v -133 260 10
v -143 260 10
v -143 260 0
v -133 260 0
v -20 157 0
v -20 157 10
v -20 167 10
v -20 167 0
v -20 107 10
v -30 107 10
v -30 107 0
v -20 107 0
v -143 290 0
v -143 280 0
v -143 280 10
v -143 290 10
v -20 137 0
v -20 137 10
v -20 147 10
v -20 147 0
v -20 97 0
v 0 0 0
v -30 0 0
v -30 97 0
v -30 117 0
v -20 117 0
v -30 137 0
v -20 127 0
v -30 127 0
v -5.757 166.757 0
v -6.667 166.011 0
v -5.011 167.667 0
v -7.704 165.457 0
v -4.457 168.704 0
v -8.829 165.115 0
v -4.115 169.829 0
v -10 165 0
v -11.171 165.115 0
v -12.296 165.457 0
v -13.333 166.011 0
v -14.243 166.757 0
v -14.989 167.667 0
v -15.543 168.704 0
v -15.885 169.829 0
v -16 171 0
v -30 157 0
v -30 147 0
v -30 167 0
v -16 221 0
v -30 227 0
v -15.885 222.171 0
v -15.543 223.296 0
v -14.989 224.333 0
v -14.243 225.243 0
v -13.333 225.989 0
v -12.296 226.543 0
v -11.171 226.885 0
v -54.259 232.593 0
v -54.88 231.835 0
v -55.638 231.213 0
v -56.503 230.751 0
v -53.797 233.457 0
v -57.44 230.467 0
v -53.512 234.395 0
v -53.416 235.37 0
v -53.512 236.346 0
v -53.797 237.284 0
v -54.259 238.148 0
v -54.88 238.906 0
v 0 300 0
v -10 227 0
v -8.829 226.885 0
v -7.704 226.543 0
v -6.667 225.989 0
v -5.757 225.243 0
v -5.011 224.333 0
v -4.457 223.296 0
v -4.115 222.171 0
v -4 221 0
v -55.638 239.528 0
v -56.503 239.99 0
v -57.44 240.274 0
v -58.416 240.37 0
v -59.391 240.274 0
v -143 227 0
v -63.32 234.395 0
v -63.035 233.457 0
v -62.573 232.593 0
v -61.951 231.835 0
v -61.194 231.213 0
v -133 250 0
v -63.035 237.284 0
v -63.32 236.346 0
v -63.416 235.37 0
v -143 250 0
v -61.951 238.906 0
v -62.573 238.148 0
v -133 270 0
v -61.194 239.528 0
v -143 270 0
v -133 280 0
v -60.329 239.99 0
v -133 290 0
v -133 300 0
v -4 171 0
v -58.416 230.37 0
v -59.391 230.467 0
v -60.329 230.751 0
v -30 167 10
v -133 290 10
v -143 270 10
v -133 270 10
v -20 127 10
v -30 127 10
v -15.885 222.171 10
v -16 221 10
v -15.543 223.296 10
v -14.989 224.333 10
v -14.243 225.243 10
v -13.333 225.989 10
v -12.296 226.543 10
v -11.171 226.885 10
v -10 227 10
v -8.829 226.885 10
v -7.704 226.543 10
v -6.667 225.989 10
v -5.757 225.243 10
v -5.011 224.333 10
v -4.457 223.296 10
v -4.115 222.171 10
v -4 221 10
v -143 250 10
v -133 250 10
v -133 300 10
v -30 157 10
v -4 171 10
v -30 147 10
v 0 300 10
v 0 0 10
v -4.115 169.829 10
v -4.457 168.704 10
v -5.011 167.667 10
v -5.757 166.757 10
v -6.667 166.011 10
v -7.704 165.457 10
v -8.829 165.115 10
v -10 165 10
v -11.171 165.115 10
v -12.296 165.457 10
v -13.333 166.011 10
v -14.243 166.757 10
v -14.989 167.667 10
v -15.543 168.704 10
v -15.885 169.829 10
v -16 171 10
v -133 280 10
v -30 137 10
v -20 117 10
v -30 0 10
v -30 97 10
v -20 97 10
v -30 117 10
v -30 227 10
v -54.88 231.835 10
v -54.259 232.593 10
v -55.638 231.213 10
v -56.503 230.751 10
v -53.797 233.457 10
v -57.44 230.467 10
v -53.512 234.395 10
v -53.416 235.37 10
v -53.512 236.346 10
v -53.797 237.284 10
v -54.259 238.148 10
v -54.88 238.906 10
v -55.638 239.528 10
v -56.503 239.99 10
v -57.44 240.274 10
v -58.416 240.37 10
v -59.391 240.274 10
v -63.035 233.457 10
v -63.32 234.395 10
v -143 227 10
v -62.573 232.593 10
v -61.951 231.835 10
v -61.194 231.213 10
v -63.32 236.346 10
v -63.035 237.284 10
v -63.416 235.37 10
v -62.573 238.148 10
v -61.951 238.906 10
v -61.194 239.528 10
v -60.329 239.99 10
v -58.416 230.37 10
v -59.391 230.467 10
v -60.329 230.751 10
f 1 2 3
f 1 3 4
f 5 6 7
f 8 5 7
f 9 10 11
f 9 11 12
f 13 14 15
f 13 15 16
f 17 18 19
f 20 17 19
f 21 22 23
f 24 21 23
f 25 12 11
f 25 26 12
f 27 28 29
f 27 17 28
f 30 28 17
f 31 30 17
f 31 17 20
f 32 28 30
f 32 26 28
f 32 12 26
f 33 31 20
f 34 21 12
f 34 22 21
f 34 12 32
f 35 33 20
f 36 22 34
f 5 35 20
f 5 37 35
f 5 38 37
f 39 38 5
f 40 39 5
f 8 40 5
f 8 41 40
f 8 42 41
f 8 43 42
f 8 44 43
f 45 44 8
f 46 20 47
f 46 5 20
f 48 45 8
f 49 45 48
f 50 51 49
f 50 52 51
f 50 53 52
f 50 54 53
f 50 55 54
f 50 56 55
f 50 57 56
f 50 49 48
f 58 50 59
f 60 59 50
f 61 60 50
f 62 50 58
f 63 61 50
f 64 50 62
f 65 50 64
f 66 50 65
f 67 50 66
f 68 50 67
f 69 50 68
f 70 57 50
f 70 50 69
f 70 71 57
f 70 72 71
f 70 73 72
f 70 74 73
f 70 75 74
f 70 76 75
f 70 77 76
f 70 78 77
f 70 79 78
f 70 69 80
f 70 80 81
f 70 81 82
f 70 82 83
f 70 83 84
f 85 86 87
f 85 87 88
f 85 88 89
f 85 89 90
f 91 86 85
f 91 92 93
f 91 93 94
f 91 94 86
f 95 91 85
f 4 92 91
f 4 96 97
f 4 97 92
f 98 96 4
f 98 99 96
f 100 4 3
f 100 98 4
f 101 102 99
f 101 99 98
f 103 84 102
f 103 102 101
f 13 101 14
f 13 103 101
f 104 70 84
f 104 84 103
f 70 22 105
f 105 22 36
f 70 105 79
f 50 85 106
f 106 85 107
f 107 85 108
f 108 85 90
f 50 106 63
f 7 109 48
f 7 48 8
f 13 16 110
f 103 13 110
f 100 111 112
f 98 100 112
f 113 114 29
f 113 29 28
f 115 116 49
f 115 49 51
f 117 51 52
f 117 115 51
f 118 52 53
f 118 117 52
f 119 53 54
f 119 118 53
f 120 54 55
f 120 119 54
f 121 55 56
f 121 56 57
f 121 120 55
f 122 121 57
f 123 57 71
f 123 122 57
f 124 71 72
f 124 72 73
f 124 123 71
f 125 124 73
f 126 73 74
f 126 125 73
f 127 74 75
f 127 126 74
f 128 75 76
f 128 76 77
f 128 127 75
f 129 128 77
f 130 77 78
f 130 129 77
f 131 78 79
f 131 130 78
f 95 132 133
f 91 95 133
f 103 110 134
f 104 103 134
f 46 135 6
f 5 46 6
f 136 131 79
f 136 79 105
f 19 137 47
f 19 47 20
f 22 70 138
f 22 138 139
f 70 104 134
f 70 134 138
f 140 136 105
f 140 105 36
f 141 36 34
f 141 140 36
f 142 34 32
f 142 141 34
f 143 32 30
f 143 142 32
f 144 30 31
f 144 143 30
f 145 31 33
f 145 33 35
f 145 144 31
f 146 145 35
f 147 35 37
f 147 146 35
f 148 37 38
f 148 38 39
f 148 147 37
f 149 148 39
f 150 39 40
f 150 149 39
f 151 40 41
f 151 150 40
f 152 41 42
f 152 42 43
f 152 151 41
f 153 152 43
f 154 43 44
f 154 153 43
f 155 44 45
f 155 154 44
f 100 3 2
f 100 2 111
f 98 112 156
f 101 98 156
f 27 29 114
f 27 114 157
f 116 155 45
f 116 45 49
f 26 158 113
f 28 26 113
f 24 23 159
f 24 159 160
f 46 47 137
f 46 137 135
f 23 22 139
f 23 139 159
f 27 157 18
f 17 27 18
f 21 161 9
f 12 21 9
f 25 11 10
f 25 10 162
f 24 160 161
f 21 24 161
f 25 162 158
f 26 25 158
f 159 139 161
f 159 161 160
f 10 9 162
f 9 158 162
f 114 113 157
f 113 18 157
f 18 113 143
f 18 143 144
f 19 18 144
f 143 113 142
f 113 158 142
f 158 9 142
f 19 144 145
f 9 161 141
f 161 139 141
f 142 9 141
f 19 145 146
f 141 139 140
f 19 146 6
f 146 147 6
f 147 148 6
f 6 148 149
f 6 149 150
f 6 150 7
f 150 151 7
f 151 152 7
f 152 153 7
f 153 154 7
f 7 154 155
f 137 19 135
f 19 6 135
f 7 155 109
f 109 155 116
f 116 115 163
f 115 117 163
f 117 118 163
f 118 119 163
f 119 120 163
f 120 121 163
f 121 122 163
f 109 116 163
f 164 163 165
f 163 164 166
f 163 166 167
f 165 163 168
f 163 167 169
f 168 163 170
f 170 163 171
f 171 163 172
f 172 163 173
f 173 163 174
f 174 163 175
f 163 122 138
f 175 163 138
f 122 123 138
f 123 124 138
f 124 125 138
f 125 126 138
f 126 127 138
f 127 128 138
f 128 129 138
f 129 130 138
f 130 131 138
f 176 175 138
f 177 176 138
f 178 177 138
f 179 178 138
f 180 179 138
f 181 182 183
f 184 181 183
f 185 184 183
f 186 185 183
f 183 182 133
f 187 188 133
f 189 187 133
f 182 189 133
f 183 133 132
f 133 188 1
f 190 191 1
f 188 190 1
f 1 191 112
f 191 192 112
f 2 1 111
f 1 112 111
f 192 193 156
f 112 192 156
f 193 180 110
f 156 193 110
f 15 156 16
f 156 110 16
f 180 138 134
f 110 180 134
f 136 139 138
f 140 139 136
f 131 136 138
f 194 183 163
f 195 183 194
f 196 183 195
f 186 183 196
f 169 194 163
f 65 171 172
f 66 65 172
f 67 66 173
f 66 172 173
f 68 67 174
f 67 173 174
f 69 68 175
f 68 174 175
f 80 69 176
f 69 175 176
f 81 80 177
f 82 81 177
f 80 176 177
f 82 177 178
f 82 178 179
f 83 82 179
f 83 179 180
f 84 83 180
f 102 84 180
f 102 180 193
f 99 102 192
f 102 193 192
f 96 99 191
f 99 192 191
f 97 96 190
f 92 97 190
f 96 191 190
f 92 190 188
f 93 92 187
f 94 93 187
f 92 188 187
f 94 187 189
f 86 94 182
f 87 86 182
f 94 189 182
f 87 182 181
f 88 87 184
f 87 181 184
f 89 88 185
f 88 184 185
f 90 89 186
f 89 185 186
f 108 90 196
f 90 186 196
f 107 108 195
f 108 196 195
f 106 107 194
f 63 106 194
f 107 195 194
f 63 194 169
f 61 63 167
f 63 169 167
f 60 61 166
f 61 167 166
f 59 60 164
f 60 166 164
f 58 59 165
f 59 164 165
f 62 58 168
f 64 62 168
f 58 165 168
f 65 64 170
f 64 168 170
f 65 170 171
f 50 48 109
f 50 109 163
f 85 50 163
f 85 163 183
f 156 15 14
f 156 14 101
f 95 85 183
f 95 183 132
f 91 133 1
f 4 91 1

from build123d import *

# Parameters (mm, degrees)
BOSS_EXTRU_1_DEPTH         = 10
ESQUISSE2_W                = 10
ESQUISSE2_H                = 10
ENL_V_MAT_EXTRU_1_DEPTH    = 10
R_P_TITION_LIN_AIRE1_COUNT = 3
R_P_TITION_LIN_AIRE1_PITCH = 20
ESQUISSE3_W                = 10
ESQUISSE3_H                = 10
ENL_V_MAT_EXTRU_2_DEPTH    = 10
R_P_TITION_LIN_AIRE2_COUNT = 4
R_P_TITION_LIN_AIRE2_PITCH = 20
ENL_V_MAT_EXTRU_3_DEPTH    = 10
ESQUISSE5_R                = 5
ENL_V_MAT_EXTRU_4_DEPTH    = 10


with BuildPart() as part:
    # Esquisse1 → Boss.-Extru.1 (new body)
    with BuildSketch(Plane.XY):
        Polygon((0, 0), (-30, 0), (-30, 227), (-143, 227), (-143, 300), (0, 300), align=None)
    extrude(amount=BOSS_EXTRU_1_DEPTH)

    # Esquisse2 → Enlèv. mat.-Extru.1 (cut)
    with BuildSketch(Plane.XY.offset(10)):
        with Locations((-138, 295)):
            Rectangle(ESQUISSE2_W, ESQUISSE2_H)
    enl_v_mat_extru_1 = extrude(amount=-ENL_V_MAT_EXTRU_1_DEPTH, mode=Mode.SUBTRACT)

    # Répétition linéaire1: Enlèv. mat.-Extru.1 ×3
    with Locations(*[(0, -i * R_P_TITION_LIN_AIRE1_PITCH, 0) for i in range(1, R_P_TITION_LIN_AIRE1_COUNT)]):
        add(enl_v_mat_extru_1, mode=Mode.SUBTRACT)

    # Esquisse3 → Enlèv. mat.-Extru.2 (cut)
    with BuildSketch(Plane.XY.offset(10)):
        with Locations((-25, 162)):
            Rectangle(ESQUISSE3_W, ESQUISSE3_H)
    enl_v_mat_extru_2 = extrude(amount=-ENL_V_MAT_EXTRU_2_DEPTH, mode=Mode.SUBTRACT)

    # Répétition linéaire2: Enlèv. mat.-Extru.2 ×4
    with Locations(*[(0, -i * R_P_TITION_LIN_AIRE2_PITCH, 0) for i in range(1, R_P_TITION_LIN_AIRE2_COUNT)]):
        add(enl_v_mat_extru_2, mode=Mode.SUBTRACT)

    # Esquisse4 → Enlèv. mat.-Extru.3 (cut)
    with BuildSketch(Plane.XY.offset(10)):
        with BuildLine():
            Line((-4, 221), (-4, 171))
            ThreePointArc((-4, 171), (-10, 165), (-16, 171))
            Line((-16, 171), (-16, 221))
            ThreePointArc((-16, 221), (-10, 227), (-4, 221))
        make_face()
    extrude(amount=-ENL_V_MAT_EXTRU_3_DEPTH, mode=Mode.SUBTRACT)

    # Esquisse5 → Enlèv. mat.-Extru.4 (cut)
    with BuildSketch(Plane.XY.offset(10)):
        with Locations((-58.415926493, 235.370461514)):
            Circle(ESQUISSE5_R)
    extrude(amount=-ENL_V_MAT_EXTRU_4_DEPTH, mode=Mode.SUBTRACT)


solid = part.part
